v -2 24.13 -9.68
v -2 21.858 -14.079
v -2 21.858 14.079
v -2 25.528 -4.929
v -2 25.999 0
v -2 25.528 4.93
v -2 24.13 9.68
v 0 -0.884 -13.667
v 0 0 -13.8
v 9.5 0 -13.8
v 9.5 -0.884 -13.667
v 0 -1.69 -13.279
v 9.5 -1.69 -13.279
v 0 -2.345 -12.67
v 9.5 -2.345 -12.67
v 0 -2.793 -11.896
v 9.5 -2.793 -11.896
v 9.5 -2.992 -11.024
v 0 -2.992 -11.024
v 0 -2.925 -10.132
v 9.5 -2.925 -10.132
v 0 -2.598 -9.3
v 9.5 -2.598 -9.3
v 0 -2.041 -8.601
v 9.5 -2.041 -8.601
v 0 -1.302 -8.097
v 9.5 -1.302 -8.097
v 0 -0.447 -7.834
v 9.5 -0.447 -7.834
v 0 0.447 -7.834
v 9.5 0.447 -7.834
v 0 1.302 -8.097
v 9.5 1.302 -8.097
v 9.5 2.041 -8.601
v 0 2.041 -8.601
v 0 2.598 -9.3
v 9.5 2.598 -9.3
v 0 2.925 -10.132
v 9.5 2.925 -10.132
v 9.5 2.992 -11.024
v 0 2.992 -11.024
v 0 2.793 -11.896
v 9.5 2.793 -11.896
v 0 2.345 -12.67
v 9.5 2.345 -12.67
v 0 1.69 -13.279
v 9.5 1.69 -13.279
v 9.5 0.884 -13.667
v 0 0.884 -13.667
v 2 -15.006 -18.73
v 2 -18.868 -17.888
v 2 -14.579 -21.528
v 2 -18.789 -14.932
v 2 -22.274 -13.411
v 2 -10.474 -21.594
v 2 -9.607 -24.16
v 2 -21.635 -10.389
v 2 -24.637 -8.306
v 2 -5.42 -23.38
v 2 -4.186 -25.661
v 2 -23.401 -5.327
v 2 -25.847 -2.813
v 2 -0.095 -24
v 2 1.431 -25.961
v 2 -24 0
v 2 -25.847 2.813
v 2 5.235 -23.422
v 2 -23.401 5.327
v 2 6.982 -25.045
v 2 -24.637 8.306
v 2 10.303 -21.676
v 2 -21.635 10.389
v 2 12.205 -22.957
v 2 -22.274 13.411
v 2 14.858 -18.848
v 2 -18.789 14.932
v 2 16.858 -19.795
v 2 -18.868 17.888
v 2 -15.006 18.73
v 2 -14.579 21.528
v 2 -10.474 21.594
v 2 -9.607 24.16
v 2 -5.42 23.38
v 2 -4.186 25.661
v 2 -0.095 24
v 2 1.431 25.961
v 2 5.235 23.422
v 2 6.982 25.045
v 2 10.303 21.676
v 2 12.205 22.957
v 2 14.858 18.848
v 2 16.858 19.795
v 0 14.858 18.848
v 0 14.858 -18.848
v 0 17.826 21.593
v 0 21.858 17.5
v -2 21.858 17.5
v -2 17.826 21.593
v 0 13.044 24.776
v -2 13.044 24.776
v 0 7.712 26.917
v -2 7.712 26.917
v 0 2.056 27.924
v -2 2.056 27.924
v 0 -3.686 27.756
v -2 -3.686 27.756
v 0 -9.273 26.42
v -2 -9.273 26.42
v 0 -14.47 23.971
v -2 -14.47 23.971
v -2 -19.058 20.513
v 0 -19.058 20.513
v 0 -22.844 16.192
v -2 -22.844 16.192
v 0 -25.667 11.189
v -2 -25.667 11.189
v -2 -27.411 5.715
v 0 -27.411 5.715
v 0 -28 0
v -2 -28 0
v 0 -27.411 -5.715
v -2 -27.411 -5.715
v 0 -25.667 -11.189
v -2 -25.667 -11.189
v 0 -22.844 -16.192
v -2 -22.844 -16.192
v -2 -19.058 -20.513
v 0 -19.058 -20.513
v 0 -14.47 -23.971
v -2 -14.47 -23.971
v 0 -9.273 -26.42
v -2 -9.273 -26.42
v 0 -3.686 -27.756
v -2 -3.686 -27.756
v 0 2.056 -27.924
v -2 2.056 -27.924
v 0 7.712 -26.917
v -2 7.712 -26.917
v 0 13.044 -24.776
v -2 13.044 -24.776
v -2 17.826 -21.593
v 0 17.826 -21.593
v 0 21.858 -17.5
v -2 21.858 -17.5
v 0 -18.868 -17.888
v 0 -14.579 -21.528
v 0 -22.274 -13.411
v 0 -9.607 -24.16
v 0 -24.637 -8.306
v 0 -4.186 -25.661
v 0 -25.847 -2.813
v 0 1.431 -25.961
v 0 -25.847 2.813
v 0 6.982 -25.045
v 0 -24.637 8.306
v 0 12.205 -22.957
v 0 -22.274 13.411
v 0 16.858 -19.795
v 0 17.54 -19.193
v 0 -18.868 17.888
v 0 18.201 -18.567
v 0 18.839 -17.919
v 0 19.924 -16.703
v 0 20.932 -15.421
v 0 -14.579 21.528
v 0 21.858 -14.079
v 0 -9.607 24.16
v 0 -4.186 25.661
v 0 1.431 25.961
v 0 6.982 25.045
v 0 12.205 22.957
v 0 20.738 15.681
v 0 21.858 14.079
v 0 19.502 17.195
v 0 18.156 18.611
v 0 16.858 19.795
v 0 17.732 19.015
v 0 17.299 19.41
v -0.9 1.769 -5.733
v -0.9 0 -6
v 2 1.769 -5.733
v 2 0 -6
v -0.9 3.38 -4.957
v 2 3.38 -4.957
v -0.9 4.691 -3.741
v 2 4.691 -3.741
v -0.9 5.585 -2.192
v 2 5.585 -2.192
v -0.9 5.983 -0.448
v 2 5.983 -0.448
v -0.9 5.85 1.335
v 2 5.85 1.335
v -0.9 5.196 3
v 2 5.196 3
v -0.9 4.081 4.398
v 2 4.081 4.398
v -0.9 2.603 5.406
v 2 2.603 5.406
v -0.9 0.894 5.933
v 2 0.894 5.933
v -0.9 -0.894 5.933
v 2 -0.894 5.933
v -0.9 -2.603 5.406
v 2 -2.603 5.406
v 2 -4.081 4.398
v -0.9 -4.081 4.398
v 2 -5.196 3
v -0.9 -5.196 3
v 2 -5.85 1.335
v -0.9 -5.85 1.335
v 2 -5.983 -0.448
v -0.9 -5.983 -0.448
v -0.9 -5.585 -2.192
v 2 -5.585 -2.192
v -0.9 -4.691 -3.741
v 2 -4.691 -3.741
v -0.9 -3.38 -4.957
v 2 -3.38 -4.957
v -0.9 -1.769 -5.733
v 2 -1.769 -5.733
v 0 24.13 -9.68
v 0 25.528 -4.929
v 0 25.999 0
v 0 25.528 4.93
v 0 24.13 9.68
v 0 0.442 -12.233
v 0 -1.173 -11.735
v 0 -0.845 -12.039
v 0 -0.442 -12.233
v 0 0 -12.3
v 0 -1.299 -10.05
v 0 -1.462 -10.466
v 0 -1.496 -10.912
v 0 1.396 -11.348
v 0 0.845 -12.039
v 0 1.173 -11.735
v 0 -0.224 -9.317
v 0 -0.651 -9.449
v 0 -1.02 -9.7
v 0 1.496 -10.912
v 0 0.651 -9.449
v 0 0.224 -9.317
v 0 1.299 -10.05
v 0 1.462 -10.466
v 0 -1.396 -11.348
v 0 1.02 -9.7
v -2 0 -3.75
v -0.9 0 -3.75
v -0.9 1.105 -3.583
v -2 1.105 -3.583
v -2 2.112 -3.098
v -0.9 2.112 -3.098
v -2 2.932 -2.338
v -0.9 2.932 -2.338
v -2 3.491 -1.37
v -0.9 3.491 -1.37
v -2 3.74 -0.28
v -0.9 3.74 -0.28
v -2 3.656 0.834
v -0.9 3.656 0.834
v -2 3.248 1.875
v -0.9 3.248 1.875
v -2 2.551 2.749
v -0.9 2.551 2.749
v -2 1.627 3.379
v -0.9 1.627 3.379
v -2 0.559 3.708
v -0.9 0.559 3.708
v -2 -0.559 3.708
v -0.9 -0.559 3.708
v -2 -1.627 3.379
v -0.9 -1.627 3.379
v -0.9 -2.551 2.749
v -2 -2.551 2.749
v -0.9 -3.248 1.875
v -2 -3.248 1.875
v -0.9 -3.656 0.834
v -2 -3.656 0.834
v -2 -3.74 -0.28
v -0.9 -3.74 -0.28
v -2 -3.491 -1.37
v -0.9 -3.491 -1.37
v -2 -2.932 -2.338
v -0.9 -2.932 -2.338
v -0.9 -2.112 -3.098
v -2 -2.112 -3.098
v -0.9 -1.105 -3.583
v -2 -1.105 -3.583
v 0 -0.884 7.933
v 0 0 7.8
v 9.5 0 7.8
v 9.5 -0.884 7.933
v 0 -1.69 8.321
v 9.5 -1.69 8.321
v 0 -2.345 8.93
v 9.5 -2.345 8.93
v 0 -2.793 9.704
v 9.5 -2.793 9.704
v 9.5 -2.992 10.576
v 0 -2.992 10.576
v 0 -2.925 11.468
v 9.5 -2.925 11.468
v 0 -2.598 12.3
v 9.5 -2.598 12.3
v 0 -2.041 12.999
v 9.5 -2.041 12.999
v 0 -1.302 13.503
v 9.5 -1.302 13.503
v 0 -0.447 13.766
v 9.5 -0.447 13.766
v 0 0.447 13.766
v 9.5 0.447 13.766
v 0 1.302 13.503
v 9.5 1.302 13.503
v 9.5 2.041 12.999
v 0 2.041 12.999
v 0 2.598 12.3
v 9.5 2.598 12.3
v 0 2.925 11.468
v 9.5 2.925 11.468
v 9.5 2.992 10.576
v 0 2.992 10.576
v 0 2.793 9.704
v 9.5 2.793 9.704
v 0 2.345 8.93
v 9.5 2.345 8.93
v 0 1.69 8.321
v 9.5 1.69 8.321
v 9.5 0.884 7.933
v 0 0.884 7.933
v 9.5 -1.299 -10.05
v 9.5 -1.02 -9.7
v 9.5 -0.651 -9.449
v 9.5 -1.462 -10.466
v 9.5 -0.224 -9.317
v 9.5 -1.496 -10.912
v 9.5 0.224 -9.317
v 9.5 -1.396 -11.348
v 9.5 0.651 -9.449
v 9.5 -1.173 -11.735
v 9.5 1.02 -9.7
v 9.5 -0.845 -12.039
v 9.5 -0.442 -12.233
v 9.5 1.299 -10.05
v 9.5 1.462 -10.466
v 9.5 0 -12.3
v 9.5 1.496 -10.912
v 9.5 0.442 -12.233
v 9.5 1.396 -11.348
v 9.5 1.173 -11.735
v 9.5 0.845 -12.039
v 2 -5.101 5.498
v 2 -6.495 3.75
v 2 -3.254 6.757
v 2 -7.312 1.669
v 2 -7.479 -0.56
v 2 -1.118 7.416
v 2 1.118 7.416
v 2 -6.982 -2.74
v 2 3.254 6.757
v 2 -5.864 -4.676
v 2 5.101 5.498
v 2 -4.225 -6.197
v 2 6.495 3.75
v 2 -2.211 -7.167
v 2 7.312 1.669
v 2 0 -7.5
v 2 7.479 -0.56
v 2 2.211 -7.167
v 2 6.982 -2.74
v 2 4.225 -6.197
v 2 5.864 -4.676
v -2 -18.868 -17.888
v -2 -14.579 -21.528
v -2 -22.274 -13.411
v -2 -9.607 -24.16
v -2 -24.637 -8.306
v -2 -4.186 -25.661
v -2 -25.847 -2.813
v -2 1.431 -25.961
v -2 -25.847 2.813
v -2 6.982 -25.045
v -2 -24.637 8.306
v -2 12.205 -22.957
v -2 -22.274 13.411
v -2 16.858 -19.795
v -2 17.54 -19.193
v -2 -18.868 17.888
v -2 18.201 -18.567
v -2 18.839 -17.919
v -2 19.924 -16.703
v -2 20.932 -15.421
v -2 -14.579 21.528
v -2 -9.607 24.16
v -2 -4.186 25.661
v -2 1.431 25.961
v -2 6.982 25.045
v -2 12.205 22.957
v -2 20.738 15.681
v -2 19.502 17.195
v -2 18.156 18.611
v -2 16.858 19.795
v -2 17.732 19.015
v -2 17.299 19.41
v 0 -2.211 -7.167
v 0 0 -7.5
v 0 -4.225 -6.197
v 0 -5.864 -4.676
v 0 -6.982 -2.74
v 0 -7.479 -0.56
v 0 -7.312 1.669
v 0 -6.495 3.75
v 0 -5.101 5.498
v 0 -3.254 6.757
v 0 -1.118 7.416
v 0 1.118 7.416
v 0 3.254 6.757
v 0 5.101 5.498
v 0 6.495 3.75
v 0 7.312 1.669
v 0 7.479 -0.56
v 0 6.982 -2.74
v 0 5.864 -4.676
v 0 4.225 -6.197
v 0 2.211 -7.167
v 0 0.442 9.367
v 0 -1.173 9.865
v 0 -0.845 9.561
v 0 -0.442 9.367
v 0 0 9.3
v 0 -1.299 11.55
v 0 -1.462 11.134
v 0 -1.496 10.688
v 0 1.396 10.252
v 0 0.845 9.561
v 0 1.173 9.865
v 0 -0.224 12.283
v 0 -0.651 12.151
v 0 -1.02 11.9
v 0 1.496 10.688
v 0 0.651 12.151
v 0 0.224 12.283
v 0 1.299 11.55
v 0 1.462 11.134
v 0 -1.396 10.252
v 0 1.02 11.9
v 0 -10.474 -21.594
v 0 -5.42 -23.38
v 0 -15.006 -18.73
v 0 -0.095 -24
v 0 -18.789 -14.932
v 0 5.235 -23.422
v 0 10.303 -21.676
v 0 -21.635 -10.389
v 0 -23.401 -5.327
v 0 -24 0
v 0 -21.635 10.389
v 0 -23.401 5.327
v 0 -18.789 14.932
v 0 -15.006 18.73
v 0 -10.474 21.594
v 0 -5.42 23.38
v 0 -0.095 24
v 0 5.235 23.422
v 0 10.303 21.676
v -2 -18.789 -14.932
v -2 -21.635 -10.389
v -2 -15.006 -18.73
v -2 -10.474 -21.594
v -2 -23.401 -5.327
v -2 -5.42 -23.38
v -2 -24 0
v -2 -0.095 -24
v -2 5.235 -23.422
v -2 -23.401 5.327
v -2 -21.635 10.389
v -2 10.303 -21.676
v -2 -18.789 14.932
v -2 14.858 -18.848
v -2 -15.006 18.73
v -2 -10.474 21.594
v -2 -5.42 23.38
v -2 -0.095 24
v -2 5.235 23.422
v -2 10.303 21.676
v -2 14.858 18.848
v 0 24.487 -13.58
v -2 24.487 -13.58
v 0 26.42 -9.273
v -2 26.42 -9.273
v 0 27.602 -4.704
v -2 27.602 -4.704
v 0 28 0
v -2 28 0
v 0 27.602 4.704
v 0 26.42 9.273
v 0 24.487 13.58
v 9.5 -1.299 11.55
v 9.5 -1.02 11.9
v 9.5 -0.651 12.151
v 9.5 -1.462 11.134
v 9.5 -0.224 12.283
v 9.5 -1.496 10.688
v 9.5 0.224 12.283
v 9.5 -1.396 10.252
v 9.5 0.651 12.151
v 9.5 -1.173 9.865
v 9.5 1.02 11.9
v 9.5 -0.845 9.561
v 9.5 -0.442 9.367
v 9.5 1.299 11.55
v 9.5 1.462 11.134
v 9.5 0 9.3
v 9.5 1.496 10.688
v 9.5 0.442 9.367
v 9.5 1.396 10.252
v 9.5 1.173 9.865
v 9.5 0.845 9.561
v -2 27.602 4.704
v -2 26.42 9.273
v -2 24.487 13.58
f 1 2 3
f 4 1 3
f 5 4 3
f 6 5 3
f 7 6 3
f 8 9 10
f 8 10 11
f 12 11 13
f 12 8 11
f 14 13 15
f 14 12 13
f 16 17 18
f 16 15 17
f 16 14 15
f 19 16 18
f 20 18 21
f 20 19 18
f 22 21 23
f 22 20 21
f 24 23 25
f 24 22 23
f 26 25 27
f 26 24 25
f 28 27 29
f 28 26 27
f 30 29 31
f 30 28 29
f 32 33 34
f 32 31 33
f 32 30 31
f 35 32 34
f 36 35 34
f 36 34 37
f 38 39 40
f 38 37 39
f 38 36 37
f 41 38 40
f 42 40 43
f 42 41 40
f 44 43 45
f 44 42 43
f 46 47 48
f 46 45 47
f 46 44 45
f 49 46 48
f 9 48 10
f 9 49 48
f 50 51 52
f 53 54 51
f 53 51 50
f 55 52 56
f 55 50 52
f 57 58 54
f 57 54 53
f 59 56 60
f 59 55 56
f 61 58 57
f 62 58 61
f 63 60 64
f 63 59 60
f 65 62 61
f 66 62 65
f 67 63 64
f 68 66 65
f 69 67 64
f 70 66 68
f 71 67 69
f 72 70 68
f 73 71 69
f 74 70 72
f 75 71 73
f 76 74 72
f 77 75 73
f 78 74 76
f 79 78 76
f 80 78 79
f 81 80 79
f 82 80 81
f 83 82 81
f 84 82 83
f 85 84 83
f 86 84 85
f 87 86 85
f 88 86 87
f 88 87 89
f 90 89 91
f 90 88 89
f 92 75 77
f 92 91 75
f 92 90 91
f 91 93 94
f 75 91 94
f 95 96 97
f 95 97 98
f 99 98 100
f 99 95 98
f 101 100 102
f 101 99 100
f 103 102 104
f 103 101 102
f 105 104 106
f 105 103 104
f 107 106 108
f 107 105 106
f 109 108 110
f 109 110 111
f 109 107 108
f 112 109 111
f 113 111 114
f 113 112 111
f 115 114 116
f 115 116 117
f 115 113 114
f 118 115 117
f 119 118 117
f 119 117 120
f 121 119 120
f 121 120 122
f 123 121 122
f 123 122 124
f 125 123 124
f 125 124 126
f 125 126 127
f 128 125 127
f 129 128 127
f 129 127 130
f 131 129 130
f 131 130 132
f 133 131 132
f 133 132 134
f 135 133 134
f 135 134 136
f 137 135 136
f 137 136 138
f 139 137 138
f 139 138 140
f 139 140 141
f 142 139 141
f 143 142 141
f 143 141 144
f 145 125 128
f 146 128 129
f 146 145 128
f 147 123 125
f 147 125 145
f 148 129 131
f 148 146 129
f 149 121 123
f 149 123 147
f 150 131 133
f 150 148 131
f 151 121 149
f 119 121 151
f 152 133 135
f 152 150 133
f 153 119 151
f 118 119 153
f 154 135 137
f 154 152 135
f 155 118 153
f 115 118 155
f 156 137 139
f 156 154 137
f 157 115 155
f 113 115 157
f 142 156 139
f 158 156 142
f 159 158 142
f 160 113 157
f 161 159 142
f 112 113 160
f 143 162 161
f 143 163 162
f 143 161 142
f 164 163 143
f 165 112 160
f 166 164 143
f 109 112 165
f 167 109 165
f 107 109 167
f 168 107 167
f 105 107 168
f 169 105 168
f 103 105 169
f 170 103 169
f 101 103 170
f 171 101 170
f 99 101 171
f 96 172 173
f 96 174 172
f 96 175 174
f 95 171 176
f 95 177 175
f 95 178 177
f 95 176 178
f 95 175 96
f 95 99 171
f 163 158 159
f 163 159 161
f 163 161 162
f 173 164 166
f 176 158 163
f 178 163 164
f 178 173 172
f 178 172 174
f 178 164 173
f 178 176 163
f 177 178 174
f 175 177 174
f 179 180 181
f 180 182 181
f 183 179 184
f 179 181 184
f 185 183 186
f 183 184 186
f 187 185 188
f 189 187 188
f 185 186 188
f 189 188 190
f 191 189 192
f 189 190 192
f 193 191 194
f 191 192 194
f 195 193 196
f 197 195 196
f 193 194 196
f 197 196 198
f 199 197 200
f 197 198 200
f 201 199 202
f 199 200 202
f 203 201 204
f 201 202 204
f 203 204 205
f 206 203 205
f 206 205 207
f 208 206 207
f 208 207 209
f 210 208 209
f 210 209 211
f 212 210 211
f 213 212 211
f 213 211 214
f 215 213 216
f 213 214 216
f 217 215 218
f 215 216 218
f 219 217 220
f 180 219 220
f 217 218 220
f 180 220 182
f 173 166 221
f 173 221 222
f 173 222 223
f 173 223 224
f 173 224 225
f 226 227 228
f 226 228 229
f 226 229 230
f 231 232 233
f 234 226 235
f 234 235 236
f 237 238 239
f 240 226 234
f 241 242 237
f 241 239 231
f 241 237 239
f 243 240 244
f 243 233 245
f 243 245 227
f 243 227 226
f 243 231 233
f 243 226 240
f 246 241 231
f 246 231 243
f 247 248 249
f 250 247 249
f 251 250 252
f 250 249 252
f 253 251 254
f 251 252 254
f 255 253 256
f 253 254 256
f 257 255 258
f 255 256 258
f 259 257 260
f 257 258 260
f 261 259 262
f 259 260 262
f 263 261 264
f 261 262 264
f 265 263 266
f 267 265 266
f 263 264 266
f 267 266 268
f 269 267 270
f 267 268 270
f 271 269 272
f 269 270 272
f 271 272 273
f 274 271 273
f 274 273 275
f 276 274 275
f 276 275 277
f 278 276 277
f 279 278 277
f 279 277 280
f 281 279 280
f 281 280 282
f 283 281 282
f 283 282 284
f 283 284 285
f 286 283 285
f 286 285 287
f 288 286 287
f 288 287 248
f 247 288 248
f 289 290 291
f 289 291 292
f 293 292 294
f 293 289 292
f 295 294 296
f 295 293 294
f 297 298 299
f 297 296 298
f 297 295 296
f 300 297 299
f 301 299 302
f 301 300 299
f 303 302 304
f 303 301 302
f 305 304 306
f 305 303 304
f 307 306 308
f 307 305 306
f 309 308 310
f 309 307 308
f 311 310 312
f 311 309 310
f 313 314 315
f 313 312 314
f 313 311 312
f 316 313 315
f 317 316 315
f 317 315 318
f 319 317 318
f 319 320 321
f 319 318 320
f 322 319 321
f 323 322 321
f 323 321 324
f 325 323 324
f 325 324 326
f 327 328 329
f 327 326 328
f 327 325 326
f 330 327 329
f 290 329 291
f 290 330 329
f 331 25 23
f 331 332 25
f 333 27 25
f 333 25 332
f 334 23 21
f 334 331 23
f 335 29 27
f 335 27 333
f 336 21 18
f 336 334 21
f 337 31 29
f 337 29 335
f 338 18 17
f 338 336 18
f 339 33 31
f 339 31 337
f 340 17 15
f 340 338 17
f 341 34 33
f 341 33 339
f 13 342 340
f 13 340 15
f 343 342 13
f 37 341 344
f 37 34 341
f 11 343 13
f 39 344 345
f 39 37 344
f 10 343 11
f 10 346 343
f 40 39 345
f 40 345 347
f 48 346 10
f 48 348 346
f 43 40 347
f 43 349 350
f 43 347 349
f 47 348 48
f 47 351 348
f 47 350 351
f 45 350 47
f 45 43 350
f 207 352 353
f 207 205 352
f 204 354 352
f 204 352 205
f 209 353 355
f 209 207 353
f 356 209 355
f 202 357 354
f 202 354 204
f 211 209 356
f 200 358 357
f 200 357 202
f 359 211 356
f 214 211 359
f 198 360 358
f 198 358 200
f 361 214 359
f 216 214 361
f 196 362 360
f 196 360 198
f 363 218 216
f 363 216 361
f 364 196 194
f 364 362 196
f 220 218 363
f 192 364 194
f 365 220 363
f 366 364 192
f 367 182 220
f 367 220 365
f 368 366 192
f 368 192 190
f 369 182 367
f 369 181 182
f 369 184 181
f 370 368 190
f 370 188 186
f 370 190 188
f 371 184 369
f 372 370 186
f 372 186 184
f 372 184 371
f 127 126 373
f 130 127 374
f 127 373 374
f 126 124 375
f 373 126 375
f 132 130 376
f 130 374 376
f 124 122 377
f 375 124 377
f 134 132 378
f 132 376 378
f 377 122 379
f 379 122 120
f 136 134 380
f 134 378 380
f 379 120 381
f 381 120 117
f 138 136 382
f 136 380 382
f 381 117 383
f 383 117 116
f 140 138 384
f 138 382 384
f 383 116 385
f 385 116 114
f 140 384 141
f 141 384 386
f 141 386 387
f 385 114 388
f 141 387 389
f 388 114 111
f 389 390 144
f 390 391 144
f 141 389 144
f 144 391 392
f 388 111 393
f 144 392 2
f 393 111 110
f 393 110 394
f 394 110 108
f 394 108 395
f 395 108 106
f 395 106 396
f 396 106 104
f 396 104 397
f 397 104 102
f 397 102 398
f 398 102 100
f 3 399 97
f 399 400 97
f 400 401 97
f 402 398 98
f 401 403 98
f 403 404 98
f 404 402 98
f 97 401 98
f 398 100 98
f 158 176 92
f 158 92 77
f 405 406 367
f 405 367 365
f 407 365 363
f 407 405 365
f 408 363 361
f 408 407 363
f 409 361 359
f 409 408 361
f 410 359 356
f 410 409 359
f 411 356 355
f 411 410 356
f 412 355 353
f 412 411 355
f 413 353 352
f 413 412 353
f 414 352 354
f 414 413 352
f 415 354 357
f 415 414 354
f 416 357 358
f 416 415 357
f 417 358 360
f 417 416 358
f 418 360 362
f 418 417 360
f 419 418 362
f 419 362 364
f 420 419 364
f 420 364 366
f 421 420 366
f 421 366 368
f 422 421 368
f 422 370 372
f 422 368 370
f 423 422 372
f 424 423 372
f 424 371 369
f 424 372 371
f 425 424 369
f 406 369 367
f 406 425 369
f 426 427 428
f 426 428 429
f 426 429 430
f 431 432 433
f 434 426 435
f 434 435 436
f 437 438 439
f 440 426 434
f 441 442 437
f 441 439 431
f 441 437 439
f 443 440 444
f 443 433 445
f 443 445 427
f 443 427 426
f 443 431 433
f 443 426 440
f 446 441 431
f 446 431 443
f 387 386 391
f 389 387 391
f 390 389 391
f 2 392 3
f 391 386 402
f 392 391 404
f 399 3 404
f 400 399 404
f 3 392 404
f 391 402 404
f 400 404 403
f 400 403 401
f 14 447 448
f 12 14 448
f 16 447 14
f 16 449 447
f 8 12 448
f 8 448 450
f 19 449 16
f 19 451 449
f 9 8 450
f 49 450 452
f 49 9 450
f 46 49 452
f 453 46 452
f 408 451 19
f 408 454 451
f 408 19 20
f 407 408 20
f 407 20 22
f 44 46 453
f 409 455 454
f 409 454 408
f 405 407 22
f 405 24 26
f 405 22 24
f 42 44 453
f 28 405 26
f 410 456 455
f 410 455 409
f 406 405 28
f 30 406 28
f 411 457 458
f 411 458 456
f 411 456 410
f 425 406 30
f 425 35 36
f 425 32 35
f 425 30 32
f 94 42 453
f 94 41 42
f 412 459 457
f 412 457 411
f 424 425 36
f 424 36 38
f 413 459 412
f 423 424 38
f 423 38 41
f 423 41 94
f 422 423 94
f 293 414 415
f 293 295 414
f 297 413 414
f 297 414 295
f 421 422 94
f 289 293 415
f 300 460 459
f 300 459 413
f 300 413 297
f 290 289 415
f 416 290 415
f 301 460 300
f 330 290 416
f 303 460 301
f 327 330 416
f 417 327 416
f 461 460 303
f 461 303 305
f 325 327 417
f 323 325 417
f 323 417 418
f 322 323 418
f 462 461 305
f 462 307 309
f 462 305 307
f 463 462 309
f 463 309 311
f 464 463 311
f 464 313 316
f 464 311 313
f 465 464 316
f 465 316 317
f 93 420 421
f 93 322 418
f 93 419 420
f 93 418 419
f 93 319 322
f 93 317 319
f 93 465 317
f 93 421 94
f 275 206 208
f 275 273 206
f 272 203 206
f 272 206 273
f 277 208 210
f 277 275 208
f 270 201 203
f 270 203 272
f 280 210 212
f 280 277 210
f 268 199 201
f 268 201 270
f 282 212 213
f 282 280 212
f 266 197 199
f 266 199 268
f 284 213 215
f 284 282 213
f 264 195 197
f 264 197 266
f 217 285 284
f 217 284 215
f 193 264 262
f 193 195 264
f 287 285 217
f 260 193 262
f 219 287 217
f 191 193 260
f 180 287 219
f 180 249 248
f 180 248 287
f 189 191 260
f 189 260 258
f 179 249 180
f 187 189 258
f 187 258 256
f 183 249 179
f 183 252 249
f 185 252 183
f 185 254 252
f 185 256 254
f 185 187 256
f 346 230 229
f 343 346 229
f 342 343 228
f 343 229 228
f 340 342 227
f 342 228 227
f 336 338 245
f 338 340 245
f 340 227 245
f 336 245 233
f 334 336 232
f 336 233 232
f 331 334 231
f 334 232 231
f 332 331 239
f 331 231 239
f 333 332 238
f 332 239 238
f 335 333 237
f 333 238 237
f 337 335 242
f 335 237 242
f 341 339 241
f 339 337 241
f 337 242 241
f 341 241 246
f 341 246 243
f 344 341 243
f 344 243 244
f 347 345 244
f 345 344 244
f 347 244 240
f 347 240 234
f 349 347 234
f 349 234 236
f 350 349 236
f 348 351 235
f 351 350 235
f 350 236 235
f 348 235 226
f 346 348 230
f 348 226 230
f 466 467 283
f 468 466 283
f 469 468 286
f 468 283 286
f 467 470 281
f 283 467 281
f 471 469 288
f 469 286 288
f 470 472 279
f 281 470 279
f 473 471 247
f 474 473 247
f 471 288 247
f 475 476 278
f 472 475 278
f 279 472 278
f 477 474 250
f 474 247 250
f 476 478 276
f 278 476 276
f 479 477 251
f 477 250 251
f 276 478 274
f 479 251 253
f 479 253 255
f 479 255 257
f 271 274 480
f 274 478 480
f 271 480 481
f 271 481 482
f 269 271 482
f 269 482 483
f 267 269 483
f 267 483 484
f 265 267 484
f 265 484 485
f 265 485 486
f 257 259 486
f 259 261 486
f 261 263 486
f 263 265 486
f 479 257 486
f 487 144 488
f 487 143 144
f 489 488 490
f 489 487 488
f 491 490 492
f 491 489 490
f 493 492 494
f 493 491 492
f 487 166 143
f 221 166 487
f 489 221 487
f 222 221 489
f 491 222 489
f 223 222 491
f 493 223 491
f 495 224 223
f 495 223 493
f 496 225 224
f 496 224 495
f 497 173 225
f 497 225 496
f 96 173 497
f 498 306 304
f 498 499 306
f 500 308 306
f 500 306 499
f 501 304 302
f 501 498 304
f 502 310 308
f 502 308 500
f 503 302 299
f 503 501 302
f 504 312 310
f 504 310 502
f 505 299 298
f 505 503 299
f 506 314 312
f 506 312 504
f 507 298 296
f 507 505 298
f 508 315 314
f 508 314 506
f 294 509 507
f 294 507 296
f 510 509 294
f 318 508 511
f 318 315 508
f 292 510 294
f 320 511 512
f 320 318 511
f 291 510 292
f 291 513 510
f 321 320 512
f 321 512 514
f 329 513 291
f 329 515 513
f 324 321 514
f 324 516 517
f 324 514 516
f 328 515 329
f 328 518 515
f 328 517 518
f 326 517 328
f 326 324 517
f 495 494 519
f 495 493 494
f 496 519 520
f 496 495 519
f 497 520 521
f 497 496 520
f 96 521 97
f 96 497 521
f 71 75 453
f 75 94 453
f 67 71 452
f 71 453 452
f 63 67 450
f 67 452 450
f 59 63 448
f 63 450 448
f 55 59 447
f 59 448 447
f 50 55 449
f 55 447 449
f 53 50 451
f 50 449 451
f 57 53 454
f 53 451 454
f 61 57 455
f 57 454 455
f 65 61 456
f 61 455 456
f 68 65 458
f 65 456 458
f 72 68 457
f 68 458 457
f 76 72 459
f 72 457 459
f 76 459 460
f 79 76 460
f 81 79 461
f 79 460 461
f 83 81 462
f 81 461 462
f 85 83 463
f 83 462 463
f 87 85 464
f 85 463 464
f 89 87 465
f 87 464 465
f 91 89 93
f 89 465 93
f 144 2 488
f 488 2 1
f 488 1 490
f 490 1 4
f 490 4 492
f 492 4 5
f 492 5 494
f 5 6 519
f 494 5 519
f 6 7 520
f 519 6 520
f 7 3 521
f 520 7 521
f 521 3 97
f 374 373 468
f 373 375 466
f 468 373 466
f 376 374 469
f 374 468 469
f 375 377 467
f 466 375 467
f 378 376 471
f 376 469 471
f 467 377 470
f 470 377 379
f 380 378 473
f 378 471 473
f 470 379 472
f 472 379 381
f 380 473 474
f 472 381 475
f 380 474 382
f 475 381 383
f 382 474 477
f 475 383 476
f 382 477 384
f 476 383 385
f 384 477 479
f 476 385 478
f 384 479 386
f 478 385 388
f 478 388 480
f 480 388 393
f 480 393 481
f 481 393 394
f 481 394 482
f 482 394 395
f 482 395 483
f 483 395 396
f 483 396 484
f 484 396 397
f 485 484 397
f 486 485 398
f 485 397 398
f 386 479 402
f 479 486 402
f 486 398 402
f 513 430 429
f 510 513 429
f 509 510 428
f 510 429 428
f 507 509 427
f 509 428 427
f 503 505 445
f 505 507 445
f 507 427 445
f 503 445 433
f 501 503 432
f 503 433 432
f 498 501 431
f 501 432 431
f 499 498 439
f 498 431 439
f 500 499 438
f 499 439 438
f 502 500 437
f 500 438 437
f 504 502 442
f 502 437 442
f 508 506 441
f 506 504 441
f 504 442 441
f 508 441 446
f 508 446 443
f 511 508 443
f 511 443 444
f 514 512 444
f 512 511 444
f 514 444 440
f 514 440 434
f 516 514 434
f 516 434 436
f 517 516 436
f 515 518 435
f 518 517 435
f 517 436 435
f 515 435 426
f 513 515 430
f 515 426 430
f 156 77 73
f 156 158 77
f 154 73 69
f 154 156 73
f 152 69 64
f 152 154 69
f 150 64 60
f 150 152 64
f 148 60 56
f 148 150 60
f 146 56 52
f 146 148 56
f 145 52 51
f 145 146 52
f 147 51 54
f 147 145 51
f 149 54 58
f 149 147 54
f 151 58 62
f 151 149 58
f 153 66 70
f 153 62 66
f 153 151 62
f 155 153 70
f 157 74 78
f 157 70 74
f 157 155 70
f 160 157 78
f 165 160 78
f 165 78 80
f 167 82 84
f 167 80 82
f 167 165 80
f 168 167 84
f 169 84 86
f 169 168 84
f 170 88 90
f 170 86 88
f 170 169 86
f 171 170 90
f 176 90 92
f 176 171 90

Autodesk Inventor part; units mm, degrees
ref_plane "YZ Plane" through (0, 0, 0) normal (1, 0, 0) x (0, 1, 0)
ref_plane "XZ Plane" through (0, 0, 0) normal (0, 1, 0) x (-1, 0, 0)
ref_plane "XY Plane" through (0, 0, 0) normal (0, 0, 1) x (1, 0, 0)
sketch "スケッチ1" plane through (0, 0, 0) normal (1, 0, 0) x (0, 1, 0)
  circle A0 centre (0, 0) radius 28
  line L0 (16.8575, 19.7946) -> (16.8575, -19.7946)
  line L1 (14.8575, 18.8482) -> (14.8575, -18.8482)
  arc A1 (18.1557, 18.611) -> (18.8392, -17.9188) centre (0, 0) ccw
  arc A2 (14.8575, 18.8482) -> (14.8575, -18.8482) centre (0, 0) ccw
  arc A3 (16.8575, 19.7946) -> (18.1557, 18.611) centre (0, 0) ccw
  arc A4 (18.8392, -17.9188) -> (16.8575, -19.7946) centre (0, 0) ccw
  line L2 (16.8575, 19.7946) -> (16.8575, -19.7946)
  line L3 (21.8575, 17.5) -> (21.8575, -17.5)
  dimension "d0" = 56
  dimension "d1" = 2
  dimension "d2" = 2
  dimension "d3" = 2
  dimension "d4" = 35
  dimension "d5" = 5
extrude "押し出し1" add sketch "スケッチ1" against normal blind 2 contours A0 L3 A3 | L3 A3 A1 A0 | L3 A3 A1 L0 | A3 L3 | L0 A1 | L1 A2
extrude "押し出し2" add sketch "スケッチ1" along normal blind 2 contours L0 A1
sketch "スケッチ2" plane through (0, 0, 0) normal (1, 0, 0) x (0, 0, -1)
  circle A0 centre (0, 0) radius 3.75
  circle A1 centre (0, 0) radius 7.5
  dimension "d10" = 7.5
  dimension "d11" = 15
extrude "押し出し3" cut sketch "スケッチ2" against normal blind 2 contours A0
extrude "押し出し4" add sketch "スケッチ2" along normal blind 2
sketch "スケッチ3" plane through (2, 0, 0) normal (1, 0, 0) x (0, 0, -1)
  circle A0 centre (0, 0) radius 6
  dimension "d16" = 12
extrude "押し出し5" cut sketch "スケッチ3" against normal blind 2.9
sketch "スケッチ4" plane through (0, 0, 0) normal (1, 0, 0) x (0, 0, -1)
  circle A0 centre (-10.8, 0) radius 3
  circle A1 centre (10.8, 0) radius 3
  circle A2 centre (-10.8, 0) radius 1.5
  circle A3 centre (10.8, 0) radius 1.5
  circle A4 centre (0, 0) radius 3.75 projected
  dimension "d19" = 6
  dimension "d20" = 6
  dimension "d21" = 3
  dimension "d22" = 3
  dimension "d23" = 10.8
  dimension "d25" = 21.6
  dimension "d26" = 10.8
extrude "押し出し6" add sketch "スケッチ4" along normal blind 9.5 contours A0 | A1
properties part number "turn2Part"
